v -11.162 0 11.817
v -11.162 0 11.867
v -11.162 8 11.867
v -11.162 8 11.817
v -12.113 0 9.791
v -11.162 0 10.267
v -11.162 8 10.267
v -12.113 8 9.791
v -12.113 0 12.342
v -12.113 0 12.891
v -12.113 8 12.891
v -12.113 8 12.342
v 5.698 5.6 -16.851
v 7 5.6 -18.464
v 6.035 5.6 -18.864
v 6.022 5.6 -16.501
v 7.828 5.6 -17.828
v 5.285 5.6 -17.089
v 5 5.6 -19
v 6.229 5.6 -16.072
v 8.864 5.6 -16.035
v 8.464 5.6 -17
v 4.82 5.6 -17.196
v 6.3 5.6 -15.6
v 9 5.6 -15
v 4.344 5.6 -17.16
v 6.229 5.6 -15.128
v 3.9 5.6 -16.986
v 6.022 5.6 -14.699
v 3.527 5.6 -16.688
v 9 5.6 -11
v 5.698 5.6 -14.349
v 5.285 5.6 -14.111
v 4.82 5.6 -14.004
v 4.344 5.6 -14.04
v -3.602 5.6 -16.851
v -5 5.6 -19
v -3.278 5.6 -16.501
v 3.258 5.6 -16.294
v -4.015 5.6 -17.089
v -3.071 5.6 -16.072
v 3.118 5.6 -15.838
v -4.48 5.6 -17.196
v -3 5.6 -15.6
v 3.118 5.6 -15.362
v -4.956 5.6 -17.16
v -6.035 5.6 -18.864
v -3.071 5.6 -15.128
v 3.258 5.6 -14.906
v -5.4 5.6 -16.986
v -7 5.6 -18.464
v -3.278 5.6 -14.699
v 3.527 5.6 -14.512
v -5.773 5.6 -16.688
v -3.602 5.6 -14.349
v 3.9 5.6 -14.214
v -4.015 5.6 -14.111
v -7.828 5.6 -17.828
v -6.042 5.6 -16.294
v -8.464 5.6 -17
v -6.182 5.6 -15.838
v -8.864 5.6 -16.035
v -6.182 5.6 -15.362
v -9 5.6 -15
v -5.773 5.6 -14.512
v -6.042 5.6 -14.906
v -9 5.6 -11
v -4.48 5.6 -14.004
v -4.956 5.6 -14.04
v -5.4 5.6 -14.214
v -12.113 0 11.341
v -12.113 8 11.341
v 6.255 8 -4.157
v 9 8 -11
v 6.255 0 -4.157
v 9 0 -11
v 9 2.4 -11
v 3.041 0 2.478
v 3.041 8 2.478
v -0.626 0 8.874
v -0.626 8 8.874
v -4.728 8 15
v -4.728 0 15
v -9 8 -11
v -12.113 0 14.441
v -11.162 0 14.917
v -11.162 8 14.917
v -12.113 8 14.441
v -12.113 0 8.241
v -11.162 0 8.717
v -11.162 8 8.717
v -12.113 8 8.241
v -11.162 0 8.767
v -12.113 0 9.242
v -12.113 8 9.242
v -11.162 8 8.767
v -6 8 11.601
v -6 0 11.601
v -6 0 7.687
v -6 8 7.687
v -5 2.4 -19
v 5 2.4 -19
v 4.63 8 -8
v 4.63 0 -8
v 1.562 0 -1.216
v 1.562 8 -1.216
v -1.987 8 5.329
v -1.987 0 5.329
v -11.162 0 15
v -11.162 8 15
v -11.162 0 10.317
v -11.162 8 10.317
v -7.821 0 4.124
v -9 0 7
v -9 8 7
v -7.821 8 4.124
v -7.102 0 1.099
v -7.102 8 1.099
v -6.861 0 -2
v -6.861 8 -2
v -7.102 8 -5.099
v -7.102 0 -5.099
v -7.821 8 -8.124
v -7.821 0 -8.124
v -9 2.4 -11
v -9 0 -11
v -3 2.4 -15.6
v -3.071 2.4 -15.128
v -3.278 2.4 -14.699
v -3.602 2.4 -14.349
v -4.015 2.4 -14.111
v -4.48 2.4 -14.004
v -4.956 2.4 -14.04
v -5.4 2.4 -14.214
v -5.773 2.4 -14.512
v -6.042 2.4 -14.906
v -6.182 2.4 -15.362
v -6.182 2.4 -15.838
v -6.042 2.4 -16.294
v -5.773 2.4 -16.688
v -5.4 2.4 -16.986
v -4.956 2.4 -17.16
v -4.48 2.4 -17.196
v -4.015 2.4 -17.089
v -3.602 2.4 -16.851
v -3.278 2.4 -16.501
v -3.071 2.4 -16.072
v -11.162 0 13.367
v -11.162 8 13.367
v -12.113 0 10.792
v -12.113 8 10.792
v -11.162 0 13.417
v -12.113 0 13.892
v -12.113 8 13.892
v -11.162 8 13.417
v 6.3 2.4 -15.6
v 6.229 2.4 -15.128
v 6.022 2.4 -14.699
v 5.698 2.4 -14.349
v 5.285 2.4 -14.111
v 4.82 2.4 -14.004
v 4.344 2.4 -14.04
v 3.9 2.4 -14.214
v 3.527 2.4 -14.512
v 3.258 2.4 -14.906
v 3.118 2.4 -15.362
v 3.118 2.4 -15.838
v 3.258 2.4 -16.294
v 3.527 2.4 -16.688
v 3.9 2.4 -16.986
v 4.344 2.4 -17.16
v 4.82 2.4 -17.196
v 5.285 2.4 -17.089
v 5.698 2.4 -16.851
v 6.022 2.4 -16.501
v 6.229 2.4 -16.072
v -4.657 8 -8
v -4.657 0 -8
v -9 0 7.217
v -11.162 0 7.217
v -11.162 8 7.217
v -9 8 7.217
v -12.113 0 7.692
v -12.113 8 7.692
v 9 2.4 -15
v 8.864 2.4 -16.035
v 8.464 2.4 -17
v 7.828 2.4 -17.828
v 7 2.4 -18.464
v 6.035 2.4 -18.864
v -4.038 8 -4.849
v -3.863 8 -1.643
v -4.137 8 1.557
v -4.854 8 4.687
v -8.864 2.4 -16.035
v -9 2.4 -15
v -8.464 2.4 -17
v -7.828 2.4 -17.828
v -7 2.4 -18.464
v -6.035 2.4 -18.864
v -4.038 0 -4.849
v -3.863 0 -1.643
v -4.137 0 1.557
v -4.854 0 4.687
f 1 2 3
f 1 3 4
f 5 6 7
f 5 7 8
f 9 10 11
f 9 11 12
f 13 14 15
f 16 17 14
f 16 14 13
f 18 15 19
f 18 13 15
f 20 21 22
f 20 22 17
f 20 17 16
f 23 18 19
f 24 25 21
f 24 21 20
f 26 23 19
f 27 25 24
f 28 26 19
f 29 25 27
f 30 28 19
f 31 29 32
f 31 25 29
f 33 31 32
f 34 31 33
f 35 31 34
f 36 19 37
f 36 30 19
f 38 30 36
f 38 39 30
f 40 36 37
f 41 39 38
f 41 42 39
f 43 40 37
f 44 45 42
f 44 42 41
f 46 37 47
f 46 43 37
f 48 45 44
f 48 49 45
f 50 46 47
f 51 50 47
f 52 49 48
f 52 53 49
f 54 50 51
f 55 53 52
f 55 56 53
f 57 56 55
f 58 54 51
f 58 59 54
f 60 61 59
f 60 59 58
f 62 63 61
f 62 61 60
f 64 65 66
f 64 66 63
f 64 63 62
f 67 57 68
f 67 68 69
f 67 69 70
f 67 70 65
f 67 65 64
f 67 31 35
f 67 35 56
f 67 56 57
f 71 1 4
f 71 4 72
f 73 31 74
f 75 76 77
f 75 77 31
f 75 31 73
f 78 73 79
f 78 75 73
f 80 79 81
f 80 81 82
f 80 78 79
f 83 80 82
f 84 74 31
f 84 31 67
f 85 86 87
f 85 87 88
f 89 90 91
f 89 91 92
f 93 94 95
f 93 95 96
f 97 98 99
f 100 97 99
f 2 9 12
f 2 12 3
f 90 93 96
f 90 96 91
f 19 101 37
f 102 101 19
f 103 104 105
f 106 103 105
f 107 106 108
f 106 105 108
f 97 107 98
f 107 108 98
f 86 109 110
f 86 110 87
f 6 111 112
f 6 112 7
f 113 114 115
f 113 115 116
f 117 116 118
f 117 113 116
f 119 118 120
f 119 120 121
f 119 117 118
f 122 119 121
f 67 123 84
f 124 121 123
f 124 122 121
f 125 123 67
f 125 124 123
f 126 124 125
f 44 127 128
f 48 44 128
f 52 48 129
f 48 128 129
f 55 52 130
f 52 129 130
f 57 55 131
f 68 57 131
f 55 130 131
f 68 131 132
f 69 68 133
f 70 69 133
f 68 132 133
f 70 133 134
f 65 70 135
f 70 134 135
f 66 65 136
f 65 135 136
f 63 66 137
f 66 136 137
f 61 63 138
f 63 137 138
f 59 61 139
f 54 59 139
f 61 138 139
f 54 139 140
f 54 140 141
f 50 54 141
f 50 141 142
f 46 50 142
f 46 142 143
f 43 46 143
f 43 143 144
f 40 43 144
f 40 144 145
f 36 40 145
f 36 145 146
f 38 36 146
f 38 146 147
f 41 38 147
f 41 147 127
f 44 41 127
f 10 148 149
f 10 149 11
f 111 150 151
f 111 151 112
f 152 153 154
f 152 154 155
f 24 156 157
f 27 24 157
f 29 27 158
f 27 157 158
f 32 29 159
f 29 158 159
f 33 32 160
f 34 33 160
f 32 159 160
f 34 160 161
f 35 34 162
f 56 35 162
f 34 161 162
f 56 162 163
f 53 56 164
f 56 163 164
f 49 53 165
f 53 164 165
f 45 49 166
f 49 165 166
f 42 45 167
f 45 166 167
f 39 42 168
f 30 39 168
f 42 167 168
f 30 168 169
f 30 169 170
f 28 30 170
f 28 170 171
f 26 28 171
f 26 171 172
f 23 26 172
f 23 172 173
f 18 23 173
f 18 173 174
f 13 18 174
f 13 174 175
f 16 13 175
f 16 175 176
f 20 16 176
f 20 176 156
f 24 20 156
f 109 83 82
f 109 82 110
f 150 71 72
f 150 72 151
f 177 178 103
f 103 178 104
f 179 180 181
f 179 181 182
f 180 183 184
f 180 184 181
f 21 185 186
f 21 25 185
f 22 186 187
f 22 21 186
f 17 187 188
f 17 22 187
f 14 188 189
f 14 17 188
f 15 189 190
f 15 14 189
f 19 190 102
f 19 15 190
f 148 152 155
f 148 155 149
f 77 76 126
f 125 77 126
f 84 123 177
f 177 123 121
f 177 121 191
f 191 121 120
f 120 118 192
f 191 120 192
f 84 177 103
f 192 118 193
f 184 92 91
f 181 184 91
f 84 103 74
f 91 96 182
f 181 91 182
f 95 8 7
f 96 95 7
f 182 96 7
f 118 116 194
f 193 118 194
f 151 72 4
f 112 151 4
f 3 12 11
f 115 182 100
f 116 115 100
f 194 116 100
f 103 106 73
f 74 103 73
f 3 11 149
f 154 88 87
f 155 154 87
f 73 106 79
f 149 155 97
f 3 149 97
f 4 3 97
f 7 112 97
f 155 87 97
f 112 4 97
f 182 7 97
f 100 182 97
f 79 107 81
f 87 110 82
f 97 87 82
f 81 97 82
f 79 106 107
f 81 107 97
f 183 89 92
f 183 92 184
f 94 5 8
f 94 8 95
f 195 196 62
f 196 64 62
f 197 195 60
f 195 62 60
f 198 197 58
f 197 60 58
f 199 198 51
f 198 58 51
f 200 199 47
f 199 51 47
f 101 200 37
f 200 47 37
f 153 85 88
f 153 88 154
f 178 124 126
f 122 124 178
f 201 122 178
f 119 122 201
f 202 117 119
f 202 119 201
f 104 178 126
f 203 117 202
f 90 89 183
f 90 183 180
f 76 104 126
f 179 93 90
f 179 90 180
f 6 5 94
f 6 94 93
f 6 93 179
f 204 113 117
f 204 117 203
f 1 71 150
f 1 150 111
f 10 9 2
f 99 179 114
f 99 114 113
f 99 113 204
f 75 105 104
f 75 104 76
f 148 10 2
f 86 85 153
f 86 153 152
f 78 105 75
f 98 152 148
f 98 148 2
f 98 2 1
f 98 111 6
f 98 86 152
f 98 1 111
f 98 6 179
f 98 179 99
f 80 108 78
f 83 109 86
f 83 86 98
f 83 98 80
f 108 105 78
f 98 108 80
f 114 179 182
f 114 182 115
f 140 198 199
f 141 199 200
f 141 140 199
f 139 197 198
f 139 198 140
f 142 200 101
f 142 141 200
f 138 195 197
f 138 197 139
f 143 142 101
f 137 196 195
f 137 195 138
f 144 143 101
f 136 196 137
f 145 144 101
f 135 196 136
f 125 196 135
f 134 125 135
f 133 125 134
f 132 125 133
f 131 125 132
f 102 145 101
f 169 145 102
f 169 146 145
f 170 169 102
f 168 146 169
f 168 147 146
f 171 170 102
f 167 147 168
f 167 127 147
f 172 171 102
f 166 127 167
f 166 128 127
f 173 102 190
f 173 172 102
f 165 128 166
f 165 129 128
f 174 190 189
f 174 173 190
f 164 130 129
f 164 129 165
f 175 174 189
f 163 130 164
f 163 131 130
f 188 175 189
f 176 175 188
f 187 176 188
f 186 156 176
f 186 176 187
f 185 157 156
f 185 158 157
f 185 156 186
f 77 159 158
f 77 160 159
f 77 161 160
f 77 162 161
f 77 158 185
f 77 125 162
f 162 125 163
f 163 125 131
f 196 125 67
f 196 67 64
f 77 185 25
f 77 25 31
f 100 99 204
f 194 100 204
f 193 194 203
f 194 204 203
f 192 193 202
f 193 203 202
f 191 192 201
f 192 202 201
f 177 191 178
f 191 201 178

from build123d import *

# Parameters (mm, degrees)
F1_DEPTH = 8
F3_DEPTH = 2.4
F2_W     = 18
F2_H     = 8
F5_DEPTH = 2.4
F7_DEPTH = 25
F8_R     = 1.6
F9_DEPTH = 25
F10_R    = 4


with BuildPart() as f1:
    # F0 (on Front) → F1 (new body)
    with BuildSketch(Plane.XZ):
        Polygon((-11.162, 13.4169430507), (-11.162, 14.9166165667), (-12.1126689762, 14.4412820786), (-12.1126689762, 13.8922775388), align=None)
        Polygon((-11.162, 11.8669430507), (-11.162, 13.3666165667), (-12.1126689762, 12.8912820786), (-12.1126689762, 12.3422775388), align=None)
        Polygon((-9, 7.217), (-9, 15), (-11.162, 15), (-11.162, 14.9166165667), (-11.162, 13.4169430507), (-11.162, 13.3666165667), (-11.162, 11.8669430507), (-11.162, 11.8166165667), (-11.162, 10.3169430507), (-11.162, 10.2666165667), (-11.162, 8.7669430507), (-11.162, 8.7166165667), (-11.162, 7.217), align=None)
        with BuildLine():
            ThreePointArc((9, -11), (3.0408534236, 2.4778498939), (-4.728292115, 15))
            Line((-4.728292115, 15), (-9, 15))
            Line((-9, 15), (-9, 7.217))
            Line((-9, 7.217), (-9, 7))
            ThreePointArc((-9, 7), (-6.8605710995, -2), (-9, -11))
            Line((-9, -11), (9, -11))
        make_face()
        Polygon((-12.1126689762, 10.7922775388), (-11.162, 10.3169430507), (-11.162, 11.8166165667), (-12.1126689762, 11.3412820786), align=None)
        Polygon((-12.1126689762, 9.2422775388), (-11.162, 8.7669430507), (-11.162, 10.2666165667), (-12.1126689762, 9.7912820786), align=None)
        Polygon((-12.1126689762, 7.6923344881), (-11.162, 7.217), (-11.162, 8.7166165667), (-12.1126689762, 8.2412820786), align=None)
        Polygon((9, -15), (9, -11), (-9, -11), (-9, -15), (-9, -19), (9, -19), align=None)
    extrude(amount=-F1_DEPTH)

    # F0 (on Front) → F3 (cut)
    with BuildSketch(Plane.XZ):
        Polygon((9, -15), (9, -11), (-9, -11), (-9, -15), (-9, -19), (9, -19), align=None)
    extrude(amount=-F3_DEPTH, mode=Mode.SUBTRACT)

    # F2 (on face) → F5 (cut)
    with BuildSketch(Plane(origin=(0, 8, 0), x_dir=(-1, 0, 0), z_dir=(0, 1, 0))):
        with Locations((0, -15)):
            Rectangle(F2_W, F2_H)
    extrude(amount=-F5_DEPTH, mode=Mode.SUBTRACT)

    # F6 (on face) → F7 (cut)
    with BuildSketch(Plane.XZ):
        with BuildLine():
            ThreePointArc((4.6301934316, -8), (-0.1534331268, 2.0887492698), (-6, 11.6010360967))
            Line((-6, 11.6010360967), (-6, 7.6869279652))
            ThreePointArc((-6, 7.6869279652), (-3.9444041717, -0.038038396), (-4.6569677883, -8))
            Line((-4.6569677883, -8), (4.6301934316, -8))
        make_face()
    extrude(amount=-F7_DEPTH, mode=Mode.SUBTRACT)

    # F8 (on face) → F9 (cut)
    with BuildSketch(Plane.XZ.offset(-2.4)):
        with Locations((-4.6, -15.6)):
            Circle(F8_R)
        with Locations((4.7, -15.6)):
            Circle(F8_R)
    extrude(amount=-F9_DEPTH, mode=Mode.SUBTRACT)

    # F10
    f10_edges = [f1.edges().sort_by_distance(p)[0] for p in [
        (-9, 4, -19),
        (9, 4, -19),
    ]]
    fillet(f10_edges, radius=F10_R)


solid = f1.part
